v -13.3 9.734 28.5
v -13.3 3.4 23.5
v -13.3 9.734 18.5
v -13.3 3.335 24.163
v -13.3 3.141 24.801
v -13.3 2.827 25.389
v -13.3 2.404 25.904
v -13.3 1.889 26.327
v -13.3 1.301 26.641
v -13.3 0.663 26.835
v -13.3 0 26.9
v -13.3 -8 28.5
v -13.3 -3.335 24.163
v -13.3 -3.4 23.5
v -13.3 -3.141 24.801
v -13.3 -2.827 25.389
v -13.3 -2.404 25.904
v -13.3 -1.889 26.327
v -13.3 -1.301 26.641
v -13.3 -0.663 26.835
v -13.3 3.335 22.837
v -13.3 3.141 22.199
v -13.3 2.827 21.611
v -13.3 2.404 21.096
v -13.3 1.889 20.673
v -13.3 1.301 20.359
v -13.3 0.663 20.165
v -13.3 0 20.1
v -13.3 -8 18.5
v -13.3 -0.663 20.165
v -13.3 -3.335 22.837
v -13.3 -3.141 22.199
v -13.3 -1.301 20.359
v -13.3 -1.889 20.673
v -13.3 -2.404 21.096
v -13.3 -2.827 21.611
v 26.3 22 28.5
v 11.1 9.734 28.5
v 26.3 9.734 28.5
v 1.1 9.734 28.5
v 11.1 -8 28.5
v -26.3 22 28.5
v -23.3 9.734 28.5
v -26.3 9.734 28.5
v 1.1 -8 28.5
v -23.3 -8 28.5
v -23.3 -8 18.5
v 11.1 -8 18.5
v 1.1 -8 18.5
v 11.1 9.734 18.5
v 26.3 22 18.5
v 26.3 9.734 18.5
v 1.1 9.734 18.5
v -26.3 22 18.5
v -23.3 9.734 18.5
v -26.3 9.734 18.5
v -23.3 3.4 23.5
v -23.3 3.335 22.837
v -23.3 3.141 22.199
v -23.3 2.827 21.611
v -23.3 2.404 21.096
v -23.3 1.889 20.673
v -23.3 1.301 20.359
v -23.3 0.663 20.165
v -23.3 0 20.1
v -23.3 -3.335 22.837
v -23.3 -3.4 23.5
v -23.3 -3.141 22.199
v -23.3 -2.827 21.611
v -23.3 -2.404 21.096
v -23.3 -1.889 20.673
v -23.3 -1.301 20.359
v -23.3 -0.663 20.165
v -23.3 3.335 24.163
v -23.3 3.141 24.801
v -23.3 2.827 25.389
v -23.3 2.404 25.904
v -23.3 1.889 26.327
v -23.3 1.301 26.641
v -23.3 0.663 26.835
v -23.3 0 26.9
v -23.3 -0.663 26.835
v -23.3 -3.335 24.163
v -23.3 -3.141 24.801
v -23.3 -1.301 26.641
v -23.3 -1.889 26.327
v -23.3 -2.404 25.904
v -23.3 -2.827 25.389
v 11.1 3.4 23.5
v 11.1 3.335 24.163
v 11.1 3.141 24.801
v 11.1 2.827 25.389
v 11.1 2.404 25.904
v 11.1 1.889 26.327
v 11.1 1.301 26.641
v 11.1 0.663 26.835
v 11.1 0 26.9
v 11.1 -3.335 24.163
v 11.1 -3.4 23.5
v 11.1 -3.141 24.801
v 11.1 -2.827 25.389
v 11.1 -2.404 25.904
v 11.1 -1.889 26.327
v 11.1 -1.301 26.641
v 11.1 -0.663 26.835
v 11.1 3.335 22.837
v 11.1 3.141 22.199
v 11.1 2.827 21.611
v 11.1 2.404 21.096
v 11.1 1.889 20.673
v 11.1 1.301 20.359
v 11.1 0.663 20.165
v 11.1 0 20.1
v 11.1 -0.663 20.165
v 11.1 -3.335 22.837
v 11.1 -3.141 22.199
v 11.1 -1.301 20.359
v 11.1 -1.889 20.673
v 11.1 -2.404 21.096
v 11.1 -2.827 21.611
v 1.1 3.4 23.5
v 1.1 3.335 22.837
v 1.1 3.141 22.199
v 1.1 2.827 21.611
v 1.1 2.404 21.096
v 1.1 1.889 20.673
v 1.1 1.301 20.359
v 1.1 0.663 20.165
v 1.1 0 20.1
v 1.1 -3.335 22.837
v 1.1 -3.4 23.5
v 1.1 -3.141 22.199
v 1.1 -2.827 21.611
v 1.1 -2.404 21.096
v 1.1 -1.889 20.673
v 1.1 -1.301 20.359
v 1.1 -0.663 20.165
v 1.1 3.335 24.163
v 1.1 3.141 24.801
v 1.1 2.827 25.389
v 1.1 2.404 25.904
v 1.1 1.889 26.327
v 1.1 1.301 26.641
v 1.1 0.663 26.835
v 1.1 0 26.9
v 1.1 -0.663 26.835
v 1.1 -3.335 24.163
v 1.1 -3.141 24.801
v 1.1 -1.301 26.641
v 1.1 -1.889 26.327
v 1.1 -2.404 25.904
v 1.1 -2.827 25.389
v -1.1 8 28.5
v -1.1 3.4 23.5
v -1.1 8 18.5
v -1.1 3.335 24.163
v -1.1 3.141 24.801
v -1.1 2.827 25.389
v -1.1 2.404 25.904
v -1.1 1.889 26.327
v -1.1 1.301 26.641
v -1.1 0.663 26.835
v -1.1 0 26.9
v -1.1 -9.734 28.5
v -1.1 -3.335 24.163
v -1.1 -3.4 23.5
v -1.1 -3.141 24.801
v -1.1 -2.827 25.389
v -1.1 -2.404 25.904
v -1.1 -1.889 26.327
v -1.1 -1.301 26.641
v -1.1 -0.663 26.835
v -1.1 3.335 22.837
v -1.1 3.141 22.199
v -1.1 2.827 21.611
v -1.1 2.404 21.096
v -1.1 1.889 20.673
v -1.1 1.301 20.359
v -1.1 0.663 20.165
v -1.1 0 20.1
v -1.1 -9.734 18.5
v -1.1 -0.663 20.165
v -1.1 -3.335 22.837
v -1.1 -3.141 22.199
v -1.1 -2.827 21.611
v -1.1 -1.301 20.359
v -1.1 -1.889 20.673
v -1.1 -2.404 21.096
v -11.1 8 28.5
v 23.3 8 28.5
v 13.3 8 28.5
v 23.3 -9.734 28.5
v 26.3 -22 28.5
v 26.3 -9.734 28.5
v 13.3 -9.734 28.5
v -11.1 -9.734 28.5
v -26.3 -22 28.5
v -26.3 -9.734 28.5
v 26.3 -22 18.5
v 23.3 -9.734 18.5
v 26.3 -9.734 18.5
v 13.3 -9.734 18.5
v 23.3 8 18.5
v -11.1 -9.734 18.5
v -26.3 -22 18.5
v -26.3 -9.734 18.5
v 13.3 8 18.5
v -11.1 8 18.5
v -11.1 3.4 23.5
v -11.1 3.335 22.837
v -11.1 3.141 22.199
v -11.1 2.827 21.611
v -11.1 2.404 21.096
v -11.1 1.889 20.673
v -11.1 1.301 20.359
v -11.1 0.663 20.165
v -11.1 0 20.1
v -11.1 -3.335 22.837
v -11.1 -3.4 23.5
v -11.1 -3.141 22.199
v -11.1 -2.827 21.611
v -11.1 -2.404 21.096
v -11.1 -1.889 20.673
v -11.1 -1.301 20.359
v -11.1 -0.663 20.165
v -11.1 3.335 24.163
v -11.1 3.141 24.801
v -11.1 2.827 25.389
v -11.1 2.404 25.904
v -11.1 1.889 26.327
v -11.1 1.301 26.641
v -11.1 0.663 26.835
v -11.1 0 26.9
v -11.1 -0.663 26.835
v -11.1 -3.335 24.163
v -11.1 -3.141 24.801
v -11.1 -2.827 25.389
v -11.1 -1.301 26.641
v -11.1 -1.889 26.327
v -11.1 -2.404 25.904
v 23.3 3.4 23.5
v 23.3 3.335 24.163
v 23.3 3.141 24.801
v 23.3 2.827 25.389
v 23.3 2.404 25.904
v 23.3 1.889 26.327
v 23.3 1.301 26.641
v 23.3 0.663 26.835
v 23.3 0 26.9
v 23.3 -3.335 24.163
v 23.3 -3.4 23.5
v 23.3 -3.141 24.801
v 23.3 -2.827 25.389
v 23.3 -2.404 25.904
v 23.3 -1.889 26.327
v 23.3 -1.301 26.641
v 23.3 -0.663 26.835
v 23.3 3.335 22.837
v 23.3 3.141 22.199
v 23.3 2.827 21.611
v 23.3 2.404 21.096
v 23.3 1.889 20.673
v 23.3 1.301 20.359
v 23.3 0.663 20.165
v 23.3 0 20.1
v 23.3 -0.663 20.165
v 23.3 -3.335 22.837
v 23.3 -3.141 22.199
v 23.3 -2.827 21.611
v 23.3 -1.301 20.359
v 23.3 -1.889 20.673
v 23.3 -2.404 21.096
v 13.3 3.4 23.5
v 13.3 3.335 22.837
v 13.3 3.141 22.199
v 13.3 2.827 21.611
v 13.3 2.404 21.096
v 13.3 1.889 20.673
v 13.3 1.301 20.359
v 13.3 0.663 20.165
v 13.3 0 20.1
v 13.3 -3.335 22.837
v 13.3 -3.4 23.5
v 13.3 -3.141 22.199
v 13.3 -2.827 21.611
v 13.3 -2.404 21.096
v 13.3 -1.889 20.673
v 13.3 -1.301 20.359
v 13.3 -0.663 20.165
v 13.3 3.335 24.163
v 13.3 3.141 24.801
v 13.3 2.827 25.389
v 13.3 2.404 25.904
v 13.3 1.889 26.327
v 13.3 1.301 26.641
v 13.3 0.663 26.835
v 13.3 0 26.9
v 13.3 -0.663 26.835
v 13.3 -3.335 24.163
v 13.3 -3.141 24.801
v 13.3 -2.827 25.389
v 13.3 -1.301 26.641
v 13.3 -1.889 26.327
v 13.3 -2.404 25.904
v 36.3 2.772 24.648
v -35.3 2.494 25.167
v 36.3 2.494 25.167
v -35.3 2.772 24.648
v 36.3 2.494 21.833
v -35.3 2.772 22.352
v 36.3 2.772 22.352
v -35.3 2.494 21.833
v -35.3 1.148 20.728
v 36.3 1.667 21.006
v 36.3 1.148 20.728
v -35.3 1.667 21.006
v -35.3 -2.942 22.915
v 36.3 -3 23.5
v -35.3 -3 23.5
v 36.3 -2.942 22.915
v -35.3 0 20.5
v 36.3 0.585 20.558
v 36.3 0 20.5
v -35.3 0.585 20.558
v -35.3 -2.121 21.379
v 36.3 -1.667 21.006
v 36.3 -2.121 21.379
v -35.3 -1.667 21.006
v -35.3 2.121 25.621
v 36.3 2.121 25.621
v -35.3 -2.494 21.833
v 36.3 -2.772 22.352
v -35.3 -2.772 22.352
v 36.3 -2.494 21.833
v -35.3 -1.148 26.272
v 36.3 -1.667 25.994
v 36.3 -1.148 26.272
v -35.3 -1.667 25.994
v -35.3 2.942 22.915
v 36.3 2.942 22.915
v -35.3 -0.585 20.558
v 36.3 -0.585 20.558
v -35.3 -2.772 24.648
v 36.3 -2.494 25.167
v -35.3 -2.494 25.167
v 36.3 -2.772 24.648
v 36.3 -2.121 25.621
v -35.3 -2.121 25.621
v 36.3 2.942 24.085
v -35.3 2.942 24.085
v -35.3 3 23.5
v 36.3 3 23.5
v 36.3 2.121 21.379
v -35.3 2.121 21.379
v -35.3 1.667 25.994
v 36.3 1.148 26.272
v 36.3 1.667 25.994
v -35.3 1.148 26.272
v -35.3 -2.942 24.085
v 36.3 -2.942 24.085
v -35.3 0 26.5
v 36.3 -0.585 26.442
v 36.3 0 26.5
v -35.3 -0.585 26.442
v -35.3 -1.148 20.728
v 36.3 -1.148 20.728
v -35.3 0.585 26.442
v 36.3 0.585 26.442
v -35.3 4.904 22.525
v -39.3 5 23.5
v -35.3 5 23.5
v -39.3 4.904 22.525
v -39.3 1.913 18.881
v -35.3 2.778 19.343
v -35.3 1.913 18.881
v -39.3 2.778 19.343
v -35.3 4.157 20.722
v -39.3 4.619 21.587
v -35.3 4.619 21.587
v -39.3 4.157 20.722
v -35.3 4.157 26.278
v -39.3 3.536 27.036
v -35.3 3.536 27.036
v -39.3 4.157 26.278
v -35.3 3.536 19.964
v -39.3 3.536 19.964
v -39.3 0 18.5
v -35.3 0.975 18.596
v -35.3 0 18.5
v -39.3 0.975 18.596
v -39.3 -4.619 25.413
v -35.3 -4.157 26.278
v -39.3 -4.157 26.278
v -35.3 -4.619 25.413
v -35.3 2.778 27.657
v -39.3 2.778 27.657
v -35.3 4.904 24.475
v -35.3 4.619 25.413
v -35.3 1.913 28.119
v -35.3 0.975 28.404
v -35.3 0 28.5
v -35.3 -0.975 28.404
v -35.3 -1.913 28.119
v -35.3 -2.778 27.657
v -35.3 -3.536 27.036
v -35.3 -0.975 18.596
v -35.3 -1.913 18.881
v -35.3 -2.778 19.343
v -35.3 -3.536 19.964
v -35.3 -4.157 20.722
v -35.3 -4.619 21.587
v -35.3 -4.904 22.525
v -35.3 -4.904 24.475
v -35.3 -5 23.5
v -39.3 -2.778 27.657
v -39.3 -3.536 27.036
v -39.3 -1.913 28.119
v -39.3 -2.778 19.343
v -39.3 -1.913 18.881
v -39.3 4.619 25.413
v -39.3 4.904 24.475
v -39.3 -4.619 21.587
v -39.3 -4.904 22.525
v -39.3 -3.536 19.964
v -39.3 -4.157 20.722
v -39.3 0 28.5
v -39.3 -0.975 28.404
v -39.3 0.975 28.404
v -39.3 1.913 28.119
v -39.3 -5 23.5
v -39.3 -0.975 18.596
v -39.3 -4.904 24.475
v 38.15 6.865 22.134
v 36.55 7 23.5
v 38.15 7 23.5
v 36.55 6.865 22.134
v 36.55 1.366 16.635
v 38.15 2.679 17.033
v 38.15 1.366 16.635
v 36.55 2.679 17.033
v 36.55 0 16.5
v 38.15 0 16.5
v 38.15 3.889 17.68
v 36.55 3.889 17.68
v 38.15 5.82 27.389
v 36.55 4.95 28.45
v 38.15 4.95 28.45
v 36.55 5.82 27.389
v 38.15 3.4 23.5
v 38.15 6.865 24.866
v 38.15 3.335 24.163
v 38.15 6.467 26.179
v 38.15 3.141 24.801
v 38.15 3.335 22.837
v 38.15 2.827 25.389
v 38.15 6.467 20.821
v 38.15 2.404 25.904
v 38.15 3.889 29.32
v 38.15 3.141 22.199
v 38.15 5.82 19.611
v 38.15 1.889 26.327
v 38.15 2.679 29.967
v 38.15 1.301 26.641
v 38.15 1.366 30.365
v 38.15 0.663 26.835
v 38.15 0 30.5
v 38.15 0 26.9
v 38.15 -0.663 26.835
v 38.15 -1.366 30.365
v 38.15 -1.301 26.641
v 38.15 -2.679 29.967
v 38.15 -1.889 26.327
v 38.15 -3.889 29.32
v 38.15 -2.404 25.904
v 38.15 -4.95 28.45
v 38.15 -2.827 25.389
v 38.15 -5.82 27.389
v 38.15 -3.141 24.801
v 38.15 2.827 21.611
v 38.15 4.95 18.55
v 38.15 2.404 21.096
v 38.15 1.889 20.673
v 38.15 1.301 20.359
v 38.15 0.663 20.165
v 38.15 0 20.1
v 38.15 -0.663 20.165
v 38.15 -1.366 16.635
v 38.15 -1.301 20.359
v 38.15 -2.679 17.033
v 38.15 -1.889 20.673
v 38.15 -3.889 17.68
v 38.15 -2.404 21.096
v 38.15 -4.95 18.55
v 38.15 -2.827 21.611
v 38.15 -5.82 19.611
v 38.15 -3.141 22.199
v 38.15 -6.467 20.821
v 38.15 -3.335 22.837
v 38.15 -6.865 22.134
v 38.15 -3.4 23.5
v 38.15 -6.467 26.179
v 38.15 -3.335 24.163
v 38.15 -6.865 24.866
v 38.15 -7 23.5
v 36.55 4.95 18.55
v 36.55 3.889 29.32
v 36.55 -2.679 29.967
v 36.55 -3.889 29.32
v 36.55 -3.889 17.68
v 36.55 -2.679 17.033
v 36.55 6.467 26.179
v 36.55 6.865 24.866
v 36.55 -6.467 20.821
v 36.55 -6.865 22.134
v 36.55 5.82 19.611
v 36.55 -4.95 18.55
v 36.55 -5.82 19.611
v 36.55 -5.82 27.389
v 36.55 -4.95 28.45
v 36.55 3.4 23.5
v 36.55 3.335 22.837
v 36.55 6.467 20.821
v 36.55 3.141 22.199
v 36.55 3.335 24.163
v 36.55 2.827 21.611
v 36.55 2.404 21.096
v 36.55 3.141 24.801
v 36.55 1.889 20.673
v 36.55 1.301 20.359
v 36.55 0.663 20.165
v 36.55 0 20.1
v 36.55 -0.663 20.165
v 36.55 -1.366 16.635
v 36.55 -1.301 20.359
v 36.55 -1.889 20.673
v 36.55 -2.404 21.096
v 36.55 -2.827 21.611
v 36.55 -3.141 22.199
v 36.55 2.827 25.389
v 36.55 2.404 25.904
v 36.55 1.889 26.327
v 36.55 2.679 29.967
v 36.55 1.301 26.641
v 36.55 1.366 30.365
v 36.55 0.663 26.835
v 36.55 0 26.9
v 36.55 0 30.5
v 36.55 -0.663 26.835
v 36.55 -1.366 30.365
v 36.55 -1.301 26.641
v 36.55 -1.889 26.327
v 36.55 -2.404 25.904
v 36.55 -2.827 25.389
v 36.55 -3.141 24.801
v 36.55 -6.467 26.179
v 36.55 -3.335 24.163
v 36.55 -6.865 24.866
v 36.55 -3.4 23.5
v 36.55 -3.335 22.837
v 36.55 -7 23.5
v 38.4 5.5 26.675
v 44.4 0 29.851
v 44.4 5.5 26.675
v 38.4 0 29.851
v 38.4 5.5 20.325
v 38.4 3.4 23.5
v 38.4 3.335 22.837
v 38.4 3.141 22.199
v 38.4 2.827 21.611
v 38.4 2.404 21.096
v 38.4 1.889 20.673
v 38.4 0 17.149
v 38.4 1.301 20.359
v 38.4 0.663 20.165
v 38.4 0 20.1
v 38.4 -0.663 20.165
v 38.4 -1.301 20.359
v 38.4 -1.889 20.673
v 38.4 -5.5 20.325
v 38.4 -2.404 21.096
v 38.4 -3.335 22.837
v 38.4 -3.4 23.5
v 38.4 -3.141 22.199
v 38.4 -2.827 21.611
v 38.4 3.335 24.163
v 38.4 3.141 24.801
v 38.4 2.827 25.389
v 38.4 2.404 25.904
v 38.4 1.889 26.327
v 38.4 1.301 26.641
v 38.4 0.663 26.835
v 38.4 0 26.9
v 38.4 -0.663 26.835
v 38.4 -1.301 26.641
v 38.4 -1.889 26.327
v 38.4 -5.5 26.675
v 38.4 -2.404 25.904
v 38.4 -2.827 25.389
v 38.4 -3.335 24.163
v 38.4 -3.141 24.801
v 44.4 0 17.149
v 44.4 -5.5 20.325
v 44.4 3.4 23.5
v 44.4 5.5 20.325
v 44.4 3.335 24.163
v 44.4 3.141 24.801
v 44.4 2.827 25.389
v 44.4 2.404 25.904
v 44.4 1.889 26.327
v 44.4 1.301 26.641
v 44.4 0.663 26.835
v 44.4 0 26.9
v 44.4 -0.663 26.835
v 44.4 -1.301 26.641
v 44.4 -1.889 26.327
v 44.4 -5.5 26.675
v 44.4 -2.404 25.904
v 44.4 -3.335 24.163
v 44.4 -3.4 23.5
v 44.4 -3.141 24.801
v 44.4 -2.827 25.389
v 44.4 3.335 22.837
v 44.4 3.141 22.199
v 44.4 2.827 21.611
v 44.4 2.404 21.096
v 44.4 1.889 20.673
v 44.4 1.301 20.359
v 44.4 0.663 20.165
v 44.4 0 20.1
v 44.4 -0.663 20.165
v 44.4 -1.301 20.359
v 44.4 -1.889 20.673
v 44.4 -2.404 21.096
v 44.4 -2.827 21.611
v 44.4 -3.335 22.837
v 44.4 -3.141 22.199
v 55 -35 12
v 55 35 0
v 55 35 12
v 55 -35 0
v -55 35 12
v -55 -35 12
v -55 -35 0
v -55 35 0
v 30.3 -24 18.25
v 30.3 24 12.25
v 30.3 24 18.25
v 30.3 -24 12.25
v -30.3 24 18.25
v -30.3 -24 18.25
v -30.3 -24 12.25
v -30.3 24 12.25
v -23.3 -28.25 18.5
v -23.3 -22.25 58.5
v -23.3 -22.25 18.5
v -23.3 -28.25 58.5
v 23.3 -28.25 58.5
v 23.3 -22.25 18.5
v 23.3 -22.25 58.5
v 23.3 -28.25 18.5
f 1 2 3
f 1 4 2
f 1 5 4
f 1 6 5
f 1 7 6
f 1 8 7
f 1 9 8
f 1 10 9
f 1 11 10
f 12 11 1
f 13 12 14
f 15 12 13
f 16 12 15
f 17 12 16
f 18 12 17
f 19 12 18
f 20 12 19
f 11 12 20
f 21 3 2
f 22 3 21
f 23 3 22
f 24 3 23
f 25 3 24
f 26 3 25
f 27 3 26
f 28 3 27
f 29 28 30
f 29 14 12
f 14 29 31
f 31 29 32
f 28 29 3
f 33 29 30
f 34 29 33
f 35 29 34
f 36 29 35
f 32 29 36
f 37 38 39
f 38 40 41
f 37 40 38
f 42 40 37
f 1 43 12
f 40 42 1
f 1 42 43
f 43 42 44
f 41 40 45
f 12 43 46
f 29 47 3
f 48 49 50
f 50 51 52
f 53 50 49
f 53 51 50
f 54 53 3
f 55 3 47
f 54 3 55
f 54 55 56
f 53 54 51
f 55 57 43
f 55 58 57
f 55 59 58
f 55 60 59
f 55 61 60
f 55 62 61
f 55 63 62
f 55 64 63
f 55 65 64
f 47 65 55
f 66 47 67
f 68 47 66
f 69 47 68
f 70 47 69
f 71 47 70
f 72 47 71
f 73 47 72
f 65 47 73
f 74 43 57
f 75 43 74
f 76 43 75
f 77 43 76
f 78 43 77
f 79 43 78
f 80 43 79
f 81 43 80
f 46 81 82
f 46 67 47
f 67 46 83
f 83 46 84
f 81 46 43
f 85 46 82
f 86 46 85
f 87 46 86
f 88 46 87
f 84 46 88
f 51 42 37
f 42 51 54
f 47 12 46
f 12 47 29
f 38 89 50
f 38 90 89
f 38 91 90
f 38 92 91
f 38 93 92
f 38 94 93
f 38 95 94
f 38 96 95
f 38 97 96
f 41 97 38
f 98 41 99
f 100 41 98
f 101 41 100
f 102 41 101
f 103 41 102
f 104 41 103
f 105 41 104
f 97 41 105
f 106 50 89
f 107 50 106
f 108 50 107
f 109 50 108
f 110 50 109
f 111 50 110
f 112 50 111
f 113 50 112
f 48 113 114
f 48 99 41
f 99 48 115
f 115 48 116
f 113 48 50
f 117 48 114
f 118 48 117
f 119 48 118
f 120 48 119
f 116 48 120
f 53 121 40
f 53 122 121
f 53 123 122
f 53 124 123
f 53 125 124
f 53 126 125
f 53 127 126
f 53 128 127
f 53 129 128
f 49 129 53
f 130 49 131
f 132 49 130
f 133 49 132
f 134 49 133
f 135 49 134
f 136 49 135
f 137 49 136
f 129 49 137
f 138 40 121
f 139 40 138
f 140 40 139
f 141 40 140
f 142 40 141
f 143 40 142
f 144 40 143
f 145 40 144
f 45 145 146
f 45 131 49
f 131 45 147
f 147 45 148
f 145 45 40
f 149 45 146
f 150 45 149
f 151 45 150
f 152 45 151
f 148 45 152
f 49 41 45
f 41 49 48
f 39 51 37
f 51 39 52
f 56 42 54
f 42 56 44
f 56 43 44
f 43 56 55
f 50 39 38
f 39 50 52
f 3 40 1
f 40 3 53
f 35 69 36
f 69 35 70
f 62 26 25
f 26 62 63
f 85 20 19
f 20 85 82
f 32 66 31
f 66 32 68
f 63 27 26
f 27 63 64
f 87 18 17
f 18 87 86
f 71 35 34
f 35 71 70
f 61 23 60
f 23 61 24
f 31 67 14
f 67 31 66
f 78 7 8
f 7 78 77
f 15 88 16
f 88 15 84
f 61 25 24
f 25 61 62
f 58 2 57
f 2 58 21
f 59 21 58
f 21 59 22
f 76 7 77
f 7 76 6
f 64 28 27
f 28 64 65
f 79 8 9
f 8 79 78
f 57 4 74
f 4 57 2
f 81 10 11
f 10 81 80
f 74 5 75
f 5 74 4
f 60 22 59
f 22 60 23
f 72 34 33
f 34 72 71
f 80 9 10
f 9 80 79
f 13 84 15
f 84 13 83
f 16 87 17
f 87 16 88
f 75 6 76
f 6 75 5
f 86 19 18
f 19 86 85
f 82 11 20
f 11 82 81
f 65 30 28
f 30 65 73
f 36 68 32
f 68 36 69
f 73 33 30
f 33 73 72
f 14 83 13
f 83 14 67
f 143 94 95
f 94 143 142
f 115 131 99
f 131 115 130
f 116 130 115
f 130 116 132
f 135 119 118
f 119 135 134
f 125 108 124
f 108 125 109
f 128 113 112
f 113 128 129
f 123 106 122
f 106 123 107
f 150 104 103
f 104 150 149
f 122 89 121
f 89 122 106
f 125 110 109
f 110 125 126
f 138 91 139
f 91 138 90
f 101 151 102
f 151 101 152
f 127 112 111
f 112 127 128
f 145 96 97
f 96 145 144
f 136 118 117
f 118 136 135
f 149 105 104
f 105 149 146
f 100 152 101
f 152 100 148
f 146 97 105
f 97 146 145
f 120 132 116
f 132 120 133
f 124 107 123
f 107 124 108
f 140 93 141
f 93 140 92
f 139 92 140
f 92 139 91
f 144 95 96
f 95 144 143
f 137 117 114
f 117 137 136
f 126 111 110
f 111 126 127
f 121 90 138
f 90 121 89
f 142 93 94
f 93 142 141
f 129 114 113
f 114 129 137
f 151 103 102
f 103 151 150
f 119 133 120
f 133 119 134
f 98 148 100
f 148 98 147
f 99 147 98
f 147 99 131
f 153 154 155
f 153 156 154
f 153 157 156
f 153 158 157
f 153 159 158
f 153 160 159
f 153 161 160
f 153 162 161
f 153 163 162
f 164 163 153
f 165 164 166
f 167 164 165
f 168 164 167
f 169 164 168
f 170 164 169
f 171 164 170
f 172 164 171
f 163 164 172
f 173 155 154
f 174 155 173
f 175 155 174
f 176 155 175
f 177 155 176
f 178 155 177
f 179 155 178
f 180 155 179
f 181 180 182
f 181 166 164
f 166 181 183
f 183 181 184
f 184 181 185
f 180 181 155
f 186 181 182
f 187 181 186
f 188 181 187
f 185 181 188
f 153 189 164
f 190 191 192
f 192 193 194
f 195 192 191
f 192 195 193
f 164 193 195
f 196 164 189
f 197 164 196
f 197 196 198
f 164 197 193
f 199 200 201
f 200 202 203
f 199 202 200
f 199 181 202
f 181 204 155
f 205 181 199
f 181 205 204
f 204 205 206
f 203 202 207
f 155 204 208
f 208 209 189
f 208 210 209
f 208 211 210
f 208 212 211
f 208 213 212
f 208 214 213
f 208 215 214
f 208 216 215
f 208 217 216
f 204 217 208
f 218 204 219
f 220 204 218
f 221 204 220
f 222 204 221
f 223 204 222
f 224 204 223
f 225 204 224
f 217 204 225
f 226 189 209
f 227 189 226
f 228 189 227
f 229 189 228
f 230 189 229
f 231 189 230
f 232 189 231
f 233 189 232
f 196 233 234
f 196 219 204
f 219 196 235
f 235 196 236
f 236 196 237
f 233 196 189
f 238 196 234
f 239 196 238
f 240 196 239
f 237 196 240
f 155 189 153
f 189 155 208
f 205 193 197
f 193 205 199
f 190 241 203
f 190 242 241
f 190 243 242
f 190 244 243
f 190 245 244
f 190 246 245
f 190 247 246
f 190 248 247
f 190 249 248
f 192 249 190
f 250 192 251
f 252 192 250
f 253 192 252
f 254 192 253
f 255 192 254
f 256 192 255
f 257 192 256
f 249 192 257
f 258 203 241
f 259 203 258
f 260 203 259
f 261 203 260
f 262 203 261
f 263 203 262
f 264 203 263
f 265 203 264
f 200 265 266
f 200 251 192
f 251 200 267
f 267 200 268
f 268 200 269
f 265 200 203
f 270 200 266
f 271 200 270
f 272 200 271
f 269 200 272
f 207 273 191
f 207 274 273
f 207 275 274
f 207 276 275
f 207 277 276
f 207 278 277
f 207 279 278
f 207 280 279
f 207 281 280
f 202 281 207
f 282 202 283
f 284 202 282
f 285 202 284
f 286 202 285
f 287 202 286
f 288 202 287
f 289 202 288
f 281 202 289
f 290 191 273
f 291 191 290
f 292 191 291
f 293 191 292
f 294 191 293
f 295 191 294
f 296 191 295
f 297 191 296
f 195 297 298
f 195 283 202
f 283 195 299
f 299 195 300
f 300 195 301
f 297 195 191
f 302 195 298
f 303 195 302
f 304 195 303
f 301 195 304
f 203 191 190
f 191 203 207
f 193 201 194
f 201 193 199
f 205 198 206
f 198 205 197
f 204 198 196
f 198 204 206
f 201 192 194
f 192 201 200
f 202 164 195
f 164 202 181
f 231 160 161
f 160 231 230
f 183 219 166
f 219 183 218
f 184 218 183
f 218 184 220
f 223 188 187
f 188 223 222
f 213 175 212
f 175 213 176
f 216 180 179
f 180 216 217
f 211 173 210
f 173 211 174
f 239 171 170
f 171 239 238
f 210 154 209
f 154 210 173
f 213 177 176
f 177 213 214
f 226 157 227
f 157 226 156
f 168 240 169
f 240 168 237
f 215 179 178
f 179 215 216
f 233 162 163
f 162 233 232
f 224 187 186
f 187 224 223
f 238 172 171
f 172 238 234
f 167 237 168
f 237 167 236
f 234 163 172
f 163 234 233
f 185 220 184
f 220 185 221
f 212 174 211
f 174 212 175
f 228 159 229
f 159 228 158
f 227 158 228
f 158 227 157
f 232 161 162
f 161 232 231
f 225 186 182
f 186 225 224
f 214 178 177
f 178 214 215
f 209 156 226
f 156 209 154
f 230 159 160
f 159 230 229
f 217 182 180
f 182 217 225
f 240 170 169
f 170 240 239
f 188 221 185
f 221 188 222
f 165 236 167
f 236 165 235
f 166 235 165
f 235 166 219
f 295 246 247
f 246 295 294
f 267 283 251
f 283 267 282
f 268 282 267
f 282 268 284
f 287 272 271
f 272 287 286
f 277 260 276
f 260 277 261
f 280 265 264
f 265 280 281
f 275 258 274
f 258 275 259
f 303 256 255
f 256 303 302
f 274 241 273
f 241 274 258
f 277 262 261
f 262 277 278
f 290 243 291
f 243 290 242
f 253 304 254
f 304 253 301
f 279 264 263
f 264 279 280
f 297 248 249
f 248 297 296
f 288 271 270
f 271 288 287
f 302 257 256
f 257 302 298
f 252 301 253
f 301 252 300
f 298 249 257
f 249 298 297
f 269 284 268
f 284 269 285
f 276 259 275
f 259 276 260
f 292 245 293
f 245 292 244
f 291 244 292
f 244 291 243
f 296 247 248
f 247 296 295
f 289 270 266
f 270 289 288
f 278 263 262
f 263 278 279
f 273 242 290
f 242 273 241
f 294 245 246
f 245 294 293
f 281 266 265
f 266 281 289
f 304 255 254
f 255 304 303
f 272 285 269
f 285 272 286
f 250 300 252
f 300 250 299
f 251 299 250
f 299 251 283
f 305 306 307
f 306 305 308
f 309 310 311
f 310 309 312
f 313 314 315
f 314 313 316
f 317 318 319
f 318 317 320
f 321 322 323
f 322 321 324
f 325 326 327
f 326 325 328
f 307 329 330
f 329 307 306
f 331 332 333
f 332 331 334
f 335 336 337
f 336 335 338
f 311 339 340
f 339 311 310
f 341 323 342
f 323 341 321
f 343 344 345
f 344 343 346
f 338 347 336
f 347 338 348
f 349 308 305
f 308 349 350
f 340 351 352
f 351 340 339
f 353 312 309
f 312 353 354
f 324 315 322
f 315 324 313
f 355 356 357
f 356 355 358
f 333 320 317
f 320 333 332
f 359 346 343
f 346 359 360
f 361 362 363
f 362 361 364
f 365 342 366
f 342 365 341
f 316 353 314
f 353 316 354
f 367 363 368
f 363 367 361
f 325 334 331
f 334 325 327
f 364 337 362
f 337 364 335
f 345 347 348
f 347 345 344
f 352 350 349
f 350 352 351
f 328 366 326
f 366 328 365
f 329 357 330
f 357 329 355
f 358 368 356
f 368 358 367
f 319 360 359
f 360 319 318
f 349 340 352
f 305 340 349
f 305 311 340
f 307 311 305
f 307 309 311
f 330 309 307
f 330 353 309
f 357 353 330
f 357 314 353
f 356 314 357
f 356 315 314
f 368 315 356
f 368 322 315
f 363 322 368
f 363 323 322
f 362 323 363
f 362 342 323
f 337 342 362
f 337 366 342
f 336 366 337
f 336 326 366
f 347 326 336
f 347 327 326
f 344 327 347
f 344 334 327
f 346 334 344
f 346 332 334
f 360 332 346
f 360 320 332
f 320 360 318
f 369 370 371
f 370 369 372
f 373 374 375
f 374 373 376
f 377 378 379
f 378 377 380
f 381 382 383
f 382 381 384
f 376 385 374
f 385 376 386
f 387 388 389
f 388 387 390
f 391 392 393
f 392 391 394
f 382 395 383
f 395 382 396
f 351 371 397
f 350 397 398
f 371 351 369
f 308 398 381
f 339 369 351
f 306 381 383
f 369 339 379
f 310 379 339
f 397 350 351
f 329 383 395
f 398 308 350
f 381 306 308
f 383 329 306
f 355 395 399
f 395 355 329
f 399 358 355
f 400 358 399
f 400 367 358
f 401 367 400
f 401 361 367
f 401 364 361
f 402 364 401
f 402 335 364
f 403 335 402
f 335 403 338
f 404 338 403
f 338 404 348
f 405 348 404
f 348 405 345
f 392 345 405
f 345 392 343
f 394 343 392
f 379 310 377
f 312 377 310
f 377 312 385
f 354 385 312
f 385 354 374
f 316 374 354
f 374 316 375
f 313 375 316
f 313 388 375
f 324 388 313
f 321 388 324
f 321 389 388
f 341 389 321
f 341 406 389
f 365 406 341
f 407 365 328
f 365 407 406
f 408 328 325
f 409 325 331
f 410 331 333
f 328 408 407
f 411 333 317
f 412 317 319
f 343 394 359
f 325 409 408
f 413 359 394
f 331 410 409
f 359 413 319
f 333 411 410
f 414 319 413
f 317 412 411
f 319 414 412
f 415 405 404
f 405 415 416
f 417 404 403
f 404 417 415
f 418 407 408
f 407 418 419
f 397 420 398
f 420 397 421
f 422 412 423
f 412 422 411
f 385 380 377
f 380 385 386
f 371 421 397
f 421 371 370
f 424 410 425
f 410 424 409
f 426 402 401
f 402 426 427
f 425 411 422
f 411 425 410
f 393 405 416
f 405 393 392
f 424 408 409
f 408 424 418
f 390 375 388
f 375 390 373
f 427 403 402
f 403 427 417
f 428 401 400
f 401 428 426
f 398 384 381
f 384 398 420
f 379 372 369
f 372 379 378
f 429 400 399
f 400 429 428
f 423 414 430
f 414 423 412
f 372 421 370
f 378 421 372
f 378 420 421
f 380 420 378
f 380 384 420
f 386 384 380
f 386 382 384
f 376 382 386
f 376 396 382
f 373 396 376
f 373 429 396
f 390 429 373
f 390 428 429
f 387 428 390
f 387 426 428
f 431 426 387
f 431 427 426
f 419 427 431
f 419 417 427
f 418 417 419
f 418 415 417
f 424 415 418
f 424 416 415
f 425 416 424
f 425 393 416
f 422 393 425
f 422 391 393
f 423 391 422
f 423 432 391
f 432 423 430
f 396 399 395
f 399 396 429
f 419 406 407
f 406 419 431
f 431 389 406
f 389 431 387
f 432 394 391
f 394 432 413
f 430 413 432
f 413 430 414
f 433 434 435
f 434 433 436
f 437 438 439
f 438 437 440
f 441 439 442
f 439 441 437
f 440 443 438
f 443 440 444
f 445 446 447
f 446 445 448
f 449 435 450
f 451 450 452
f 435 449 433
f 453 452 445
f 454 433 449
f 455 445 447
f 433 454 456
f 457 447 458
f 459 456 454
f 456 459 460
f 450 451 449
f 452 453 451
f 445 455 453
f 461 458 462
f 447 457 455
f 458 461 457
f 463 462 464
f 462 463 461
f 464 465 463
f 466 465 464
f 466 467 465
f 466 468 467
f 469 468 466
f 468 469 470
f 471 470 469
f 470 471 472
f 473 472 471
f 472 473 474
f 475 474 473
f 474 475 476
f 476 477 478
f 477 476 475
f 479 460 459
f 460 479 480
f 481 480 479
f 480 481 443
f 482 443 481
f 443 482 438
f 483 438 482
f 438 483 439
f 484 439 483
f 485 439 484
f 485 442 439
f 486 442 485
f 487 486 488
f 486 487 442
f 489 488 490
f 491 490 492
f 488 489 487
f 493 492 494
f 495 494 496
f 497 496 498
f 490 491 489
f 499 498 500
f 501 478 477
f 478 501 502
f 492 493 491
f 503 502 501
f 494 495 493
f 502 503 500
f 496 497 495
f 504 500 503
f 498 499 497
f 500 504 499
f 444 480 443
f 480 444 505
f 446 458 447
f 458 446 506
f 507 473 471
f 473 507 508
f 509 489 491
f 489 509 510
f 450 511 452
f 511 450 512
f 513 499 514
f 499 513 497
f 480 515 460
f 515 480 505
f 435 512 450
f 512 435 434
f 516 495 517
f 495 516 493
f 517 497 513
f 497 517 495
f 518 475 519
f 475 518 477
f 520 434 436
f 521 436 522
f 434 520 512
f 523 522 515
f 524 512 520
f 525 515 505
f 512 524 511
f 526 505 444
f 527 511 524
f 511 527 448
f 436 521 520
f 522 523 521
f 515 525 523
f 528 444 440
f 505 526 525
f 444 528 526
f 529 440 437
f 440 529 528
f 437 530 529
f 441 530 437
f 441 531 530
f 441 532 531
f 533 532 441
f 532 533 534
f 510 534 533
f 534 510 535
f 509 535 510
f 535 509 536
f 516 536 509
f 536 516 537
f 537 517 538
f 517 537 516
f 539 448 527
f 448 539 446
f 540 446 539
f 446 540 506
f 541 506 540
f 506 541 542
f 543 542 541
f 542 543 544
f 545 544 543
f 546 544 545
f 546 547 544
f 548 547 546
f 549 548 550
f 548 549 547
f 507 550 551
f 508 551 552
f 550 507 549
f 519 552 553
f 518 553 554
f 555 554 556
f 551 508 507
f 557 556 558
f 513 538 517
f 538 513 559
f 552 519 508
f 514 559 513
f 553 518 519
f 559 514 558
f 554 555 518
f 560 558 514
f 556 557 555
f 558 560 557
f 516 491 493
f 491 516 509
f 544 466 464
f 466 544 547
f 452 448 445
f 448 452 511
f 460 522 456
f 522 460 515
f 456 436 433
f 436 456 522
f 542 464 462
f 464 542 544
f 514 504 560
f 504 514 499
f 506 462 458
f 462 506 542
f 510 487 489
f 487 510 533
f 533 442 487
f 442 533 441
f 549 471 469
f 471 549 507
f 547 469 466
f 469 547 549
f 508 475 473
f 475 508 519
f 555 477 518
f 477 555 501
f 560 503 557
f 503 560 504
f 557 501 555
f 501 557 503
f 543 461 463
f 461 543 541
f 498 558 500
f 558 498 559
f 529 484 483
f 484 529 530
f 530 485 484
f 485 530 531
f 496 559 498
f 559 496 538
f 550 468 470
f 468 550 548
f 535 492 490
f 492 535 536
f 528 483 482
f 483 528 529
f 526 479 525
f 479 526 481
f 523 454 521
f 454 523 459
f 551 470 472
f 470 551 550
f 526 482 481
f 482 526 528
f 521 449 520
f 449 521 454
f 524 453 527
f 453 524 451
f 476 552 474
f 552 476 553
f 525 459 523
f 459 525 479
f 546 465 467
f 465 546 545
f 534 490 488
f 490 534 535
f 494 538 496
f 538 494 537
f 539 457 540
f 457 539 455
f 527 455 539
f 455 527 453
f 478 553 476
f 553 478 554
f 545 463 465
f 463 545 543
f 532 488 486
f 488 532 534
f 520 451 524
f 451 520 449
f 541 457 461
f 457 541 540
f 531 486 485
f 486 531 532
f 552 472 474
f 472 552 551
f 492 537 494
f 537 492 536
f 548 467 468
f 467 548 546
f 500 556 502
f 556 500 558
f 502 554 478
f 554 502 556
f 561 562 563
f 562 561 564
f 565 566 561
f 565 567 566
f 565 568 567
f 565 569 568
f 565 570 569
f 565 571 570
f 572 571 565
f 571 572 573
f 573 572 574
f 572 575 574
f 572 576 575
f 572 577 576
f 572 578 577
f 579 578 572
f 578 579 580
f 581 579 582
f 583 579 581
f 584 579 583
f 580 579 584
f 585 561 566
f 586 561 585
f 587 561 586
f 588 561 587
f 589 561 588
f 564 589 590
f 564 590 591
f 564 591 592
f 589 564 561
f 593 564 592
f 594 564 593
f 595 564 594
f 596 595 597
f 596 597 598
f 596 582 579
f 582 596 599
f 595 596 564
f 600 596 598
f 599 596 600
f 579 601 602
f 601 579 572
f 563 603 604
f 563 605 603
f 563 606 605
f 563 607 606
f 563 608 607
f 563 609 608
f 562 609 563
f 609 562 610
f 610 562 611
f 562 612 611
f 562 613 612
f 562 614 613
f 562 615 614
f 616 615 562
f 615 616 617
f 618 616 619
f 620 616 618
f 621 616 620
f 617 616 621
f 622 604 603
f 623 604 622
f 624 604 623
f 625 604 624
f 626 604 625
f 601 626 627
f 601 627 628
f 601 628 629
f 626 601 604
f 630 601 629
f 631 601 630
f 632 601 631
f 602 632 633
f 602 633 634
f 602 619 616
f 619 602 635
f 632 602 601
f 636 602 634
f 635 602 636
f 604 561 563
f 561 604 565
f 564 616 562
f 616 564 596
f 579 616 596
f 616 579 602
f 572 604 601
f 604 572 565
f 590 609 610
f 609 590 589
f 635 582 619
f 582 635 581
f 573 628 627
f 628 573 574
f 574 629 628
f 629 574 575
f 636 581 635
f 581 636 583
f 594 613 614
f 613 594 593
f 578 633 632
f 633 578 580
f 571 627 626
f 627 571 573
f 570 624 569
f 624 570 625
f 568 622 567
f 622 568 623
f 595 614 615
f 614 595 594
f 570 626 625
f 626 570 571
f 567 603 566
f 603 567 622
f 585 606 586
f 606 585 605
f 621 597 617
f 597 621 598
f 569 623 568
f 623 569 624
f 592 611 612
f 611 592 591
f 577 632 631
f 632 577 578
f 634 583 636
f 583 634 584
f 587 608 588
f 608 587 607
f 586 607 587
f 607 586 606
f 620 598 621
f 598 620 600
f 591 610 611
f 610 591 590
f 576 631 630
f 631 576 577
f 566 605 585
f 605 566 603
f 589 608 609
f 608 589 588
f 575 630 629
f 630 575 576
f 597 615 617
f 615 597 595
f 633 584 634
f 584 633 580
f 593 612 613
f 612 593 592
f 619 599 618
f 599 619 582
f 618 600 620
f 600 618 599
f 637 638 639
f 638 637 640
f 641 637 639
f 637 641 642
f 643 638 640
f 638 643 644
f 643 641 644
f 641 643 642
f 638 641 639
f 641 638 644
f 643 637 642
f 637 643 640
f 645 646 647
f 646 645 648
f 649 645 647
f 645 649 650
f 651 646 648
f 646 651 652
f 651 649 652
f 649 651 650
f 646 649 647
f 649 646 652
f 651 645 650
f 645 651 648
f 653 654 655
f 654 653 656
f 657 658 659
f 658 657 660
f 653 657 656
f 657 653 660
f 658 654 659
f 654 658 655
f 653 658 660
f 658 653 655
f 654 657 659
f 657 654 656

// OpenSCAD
$fn = 32;

// ------------------------------------------------------------------------
// Comb hinge with flap: leaf 52.6 x 22 mm, pin d6, flap 40 mm
// Every part is its own module, assembly() places every instance.
// ------------------------------------------------------------------------

// --- part 1 ---
module hinge_bed() {
  difference() {
    translate([-55, -35, 0]) cube([110, 70, 12]);
  }
}

// --- part 2 ---
module hinge_riser() {
  difference() {
    translate([-30.3, -24, 0]) cube([60.6, 48, 6]);
  }
}

// --- part 3 ---
module hinge_leaf_a() {
  difference() {
    union() {
      translate([-23.3, -8, -5]) cube([10, 30, 10]);
      translate([1.1, -8, -5]) cube([10, 30, 10]);
      translate([-26.3, 9.734, -5]) cube([52.6, 12.266, 10]);
    }
    translate([-18.3, 0, 0]) rotate([0, 90, 0]) cylinder(h = 12, d = 6.8, center = true);
    translate([6.1, 0, 0]) rotate([0, 90, 0]) cylinder(h = 12, d = 6.8, center = true);
  }
}

// --- part 4 ---
module hinge_leaf_b() {
  difference() {
    union() {
      translate([-11.1, -22, -5]) cube([10, 30, 10]);
      translate([13.3, -22, -5]) cube([10, 30, 10]);
      translate([-26.3, -22, -5]) cube([52.6, 12.266, 10]);
    }
    translate([-6.1, 0, 0]) rotate([0, 90, 0]) cylinder(h = 12, d = 6.8, center = true);
    translate([18.3, 0, 0]) rotate([0, 90, 0]) cylinder(h = 12, d = 6.8, center = true);
  }
}

// --- part 5 ---
module hinge_flap() {
  difference() {
    translate([-23.3, -20, 0]) cube([46.6, 40, 6]);
  }
}

// --- part 6 ---
module hinge_pin() {
  rotate([0, 90, 0]) cylinder(h = 72.6, d = 6, center = true);
  translate([-39.3, 0, 0]) rotate([0, 90, 0]) cylinder(h = 4, d = 10);
}

// --- part 7 ---
module pin_washer() {
  difference() {
      translate([0, 0, 0]) cylinder(h = 1.6, d = 14);
      translate([0, 0, -1]) cylinder(h = 3.6, d = 6.8);
    }
}

// --- part 8 ---
module pin_nut() {
  difference() {
    linear_extrude(height = 6) polygon(points = [[6.351, 0], [3.175, 5.5], [-3.175, 5.5], [-6.351, 0], [-3.175, -5.5], [3.175, -5.5]]);
    translate([0, 0, -1]) cylinder(h = 8, d = 6.8);
  }
}

// --- assembly ---
module assembly() {
  color([0.80, 0.24, 0.20]) translate([0, 0, 0]) rotate([0, 0, 0]) hinge_bed();
  color([0.20, 0.45, 0.75]) translate([0, 0, 12.25]) rotate([0, 0, 0]) hinge_riser();
  color([0.25, 0.62, 0.32]) translate([0, 0, 23.5]) rotate([0, 0, 0]) hinge_leaf_a();
  color([0.92, 0.70, 0.18]) translate([0, 0, 23.5]) rotate([0, 0, 0]) hinge_leaf_b();
  color([0.58, 0.35, 0.70]) translate([0, -22.25, 38.5]) rotate([90, 0, 0]) hinge_flap();
  color([0.16, 0.66, 0.66]) translate([0, 0, 23.5]) rotate([0, 0, 0]) hinge_pin();
  color([0.85, 0.48, 0.18]) translate([36.55, 0, 23.5]) rotate([0, 90, 0]) pin_washer();
  color([0.55, 0.60, 0.65]) translate([38.4, 0, 23.5]) rotate([0, 90, 0]) pin_nut();
}

assembly();
